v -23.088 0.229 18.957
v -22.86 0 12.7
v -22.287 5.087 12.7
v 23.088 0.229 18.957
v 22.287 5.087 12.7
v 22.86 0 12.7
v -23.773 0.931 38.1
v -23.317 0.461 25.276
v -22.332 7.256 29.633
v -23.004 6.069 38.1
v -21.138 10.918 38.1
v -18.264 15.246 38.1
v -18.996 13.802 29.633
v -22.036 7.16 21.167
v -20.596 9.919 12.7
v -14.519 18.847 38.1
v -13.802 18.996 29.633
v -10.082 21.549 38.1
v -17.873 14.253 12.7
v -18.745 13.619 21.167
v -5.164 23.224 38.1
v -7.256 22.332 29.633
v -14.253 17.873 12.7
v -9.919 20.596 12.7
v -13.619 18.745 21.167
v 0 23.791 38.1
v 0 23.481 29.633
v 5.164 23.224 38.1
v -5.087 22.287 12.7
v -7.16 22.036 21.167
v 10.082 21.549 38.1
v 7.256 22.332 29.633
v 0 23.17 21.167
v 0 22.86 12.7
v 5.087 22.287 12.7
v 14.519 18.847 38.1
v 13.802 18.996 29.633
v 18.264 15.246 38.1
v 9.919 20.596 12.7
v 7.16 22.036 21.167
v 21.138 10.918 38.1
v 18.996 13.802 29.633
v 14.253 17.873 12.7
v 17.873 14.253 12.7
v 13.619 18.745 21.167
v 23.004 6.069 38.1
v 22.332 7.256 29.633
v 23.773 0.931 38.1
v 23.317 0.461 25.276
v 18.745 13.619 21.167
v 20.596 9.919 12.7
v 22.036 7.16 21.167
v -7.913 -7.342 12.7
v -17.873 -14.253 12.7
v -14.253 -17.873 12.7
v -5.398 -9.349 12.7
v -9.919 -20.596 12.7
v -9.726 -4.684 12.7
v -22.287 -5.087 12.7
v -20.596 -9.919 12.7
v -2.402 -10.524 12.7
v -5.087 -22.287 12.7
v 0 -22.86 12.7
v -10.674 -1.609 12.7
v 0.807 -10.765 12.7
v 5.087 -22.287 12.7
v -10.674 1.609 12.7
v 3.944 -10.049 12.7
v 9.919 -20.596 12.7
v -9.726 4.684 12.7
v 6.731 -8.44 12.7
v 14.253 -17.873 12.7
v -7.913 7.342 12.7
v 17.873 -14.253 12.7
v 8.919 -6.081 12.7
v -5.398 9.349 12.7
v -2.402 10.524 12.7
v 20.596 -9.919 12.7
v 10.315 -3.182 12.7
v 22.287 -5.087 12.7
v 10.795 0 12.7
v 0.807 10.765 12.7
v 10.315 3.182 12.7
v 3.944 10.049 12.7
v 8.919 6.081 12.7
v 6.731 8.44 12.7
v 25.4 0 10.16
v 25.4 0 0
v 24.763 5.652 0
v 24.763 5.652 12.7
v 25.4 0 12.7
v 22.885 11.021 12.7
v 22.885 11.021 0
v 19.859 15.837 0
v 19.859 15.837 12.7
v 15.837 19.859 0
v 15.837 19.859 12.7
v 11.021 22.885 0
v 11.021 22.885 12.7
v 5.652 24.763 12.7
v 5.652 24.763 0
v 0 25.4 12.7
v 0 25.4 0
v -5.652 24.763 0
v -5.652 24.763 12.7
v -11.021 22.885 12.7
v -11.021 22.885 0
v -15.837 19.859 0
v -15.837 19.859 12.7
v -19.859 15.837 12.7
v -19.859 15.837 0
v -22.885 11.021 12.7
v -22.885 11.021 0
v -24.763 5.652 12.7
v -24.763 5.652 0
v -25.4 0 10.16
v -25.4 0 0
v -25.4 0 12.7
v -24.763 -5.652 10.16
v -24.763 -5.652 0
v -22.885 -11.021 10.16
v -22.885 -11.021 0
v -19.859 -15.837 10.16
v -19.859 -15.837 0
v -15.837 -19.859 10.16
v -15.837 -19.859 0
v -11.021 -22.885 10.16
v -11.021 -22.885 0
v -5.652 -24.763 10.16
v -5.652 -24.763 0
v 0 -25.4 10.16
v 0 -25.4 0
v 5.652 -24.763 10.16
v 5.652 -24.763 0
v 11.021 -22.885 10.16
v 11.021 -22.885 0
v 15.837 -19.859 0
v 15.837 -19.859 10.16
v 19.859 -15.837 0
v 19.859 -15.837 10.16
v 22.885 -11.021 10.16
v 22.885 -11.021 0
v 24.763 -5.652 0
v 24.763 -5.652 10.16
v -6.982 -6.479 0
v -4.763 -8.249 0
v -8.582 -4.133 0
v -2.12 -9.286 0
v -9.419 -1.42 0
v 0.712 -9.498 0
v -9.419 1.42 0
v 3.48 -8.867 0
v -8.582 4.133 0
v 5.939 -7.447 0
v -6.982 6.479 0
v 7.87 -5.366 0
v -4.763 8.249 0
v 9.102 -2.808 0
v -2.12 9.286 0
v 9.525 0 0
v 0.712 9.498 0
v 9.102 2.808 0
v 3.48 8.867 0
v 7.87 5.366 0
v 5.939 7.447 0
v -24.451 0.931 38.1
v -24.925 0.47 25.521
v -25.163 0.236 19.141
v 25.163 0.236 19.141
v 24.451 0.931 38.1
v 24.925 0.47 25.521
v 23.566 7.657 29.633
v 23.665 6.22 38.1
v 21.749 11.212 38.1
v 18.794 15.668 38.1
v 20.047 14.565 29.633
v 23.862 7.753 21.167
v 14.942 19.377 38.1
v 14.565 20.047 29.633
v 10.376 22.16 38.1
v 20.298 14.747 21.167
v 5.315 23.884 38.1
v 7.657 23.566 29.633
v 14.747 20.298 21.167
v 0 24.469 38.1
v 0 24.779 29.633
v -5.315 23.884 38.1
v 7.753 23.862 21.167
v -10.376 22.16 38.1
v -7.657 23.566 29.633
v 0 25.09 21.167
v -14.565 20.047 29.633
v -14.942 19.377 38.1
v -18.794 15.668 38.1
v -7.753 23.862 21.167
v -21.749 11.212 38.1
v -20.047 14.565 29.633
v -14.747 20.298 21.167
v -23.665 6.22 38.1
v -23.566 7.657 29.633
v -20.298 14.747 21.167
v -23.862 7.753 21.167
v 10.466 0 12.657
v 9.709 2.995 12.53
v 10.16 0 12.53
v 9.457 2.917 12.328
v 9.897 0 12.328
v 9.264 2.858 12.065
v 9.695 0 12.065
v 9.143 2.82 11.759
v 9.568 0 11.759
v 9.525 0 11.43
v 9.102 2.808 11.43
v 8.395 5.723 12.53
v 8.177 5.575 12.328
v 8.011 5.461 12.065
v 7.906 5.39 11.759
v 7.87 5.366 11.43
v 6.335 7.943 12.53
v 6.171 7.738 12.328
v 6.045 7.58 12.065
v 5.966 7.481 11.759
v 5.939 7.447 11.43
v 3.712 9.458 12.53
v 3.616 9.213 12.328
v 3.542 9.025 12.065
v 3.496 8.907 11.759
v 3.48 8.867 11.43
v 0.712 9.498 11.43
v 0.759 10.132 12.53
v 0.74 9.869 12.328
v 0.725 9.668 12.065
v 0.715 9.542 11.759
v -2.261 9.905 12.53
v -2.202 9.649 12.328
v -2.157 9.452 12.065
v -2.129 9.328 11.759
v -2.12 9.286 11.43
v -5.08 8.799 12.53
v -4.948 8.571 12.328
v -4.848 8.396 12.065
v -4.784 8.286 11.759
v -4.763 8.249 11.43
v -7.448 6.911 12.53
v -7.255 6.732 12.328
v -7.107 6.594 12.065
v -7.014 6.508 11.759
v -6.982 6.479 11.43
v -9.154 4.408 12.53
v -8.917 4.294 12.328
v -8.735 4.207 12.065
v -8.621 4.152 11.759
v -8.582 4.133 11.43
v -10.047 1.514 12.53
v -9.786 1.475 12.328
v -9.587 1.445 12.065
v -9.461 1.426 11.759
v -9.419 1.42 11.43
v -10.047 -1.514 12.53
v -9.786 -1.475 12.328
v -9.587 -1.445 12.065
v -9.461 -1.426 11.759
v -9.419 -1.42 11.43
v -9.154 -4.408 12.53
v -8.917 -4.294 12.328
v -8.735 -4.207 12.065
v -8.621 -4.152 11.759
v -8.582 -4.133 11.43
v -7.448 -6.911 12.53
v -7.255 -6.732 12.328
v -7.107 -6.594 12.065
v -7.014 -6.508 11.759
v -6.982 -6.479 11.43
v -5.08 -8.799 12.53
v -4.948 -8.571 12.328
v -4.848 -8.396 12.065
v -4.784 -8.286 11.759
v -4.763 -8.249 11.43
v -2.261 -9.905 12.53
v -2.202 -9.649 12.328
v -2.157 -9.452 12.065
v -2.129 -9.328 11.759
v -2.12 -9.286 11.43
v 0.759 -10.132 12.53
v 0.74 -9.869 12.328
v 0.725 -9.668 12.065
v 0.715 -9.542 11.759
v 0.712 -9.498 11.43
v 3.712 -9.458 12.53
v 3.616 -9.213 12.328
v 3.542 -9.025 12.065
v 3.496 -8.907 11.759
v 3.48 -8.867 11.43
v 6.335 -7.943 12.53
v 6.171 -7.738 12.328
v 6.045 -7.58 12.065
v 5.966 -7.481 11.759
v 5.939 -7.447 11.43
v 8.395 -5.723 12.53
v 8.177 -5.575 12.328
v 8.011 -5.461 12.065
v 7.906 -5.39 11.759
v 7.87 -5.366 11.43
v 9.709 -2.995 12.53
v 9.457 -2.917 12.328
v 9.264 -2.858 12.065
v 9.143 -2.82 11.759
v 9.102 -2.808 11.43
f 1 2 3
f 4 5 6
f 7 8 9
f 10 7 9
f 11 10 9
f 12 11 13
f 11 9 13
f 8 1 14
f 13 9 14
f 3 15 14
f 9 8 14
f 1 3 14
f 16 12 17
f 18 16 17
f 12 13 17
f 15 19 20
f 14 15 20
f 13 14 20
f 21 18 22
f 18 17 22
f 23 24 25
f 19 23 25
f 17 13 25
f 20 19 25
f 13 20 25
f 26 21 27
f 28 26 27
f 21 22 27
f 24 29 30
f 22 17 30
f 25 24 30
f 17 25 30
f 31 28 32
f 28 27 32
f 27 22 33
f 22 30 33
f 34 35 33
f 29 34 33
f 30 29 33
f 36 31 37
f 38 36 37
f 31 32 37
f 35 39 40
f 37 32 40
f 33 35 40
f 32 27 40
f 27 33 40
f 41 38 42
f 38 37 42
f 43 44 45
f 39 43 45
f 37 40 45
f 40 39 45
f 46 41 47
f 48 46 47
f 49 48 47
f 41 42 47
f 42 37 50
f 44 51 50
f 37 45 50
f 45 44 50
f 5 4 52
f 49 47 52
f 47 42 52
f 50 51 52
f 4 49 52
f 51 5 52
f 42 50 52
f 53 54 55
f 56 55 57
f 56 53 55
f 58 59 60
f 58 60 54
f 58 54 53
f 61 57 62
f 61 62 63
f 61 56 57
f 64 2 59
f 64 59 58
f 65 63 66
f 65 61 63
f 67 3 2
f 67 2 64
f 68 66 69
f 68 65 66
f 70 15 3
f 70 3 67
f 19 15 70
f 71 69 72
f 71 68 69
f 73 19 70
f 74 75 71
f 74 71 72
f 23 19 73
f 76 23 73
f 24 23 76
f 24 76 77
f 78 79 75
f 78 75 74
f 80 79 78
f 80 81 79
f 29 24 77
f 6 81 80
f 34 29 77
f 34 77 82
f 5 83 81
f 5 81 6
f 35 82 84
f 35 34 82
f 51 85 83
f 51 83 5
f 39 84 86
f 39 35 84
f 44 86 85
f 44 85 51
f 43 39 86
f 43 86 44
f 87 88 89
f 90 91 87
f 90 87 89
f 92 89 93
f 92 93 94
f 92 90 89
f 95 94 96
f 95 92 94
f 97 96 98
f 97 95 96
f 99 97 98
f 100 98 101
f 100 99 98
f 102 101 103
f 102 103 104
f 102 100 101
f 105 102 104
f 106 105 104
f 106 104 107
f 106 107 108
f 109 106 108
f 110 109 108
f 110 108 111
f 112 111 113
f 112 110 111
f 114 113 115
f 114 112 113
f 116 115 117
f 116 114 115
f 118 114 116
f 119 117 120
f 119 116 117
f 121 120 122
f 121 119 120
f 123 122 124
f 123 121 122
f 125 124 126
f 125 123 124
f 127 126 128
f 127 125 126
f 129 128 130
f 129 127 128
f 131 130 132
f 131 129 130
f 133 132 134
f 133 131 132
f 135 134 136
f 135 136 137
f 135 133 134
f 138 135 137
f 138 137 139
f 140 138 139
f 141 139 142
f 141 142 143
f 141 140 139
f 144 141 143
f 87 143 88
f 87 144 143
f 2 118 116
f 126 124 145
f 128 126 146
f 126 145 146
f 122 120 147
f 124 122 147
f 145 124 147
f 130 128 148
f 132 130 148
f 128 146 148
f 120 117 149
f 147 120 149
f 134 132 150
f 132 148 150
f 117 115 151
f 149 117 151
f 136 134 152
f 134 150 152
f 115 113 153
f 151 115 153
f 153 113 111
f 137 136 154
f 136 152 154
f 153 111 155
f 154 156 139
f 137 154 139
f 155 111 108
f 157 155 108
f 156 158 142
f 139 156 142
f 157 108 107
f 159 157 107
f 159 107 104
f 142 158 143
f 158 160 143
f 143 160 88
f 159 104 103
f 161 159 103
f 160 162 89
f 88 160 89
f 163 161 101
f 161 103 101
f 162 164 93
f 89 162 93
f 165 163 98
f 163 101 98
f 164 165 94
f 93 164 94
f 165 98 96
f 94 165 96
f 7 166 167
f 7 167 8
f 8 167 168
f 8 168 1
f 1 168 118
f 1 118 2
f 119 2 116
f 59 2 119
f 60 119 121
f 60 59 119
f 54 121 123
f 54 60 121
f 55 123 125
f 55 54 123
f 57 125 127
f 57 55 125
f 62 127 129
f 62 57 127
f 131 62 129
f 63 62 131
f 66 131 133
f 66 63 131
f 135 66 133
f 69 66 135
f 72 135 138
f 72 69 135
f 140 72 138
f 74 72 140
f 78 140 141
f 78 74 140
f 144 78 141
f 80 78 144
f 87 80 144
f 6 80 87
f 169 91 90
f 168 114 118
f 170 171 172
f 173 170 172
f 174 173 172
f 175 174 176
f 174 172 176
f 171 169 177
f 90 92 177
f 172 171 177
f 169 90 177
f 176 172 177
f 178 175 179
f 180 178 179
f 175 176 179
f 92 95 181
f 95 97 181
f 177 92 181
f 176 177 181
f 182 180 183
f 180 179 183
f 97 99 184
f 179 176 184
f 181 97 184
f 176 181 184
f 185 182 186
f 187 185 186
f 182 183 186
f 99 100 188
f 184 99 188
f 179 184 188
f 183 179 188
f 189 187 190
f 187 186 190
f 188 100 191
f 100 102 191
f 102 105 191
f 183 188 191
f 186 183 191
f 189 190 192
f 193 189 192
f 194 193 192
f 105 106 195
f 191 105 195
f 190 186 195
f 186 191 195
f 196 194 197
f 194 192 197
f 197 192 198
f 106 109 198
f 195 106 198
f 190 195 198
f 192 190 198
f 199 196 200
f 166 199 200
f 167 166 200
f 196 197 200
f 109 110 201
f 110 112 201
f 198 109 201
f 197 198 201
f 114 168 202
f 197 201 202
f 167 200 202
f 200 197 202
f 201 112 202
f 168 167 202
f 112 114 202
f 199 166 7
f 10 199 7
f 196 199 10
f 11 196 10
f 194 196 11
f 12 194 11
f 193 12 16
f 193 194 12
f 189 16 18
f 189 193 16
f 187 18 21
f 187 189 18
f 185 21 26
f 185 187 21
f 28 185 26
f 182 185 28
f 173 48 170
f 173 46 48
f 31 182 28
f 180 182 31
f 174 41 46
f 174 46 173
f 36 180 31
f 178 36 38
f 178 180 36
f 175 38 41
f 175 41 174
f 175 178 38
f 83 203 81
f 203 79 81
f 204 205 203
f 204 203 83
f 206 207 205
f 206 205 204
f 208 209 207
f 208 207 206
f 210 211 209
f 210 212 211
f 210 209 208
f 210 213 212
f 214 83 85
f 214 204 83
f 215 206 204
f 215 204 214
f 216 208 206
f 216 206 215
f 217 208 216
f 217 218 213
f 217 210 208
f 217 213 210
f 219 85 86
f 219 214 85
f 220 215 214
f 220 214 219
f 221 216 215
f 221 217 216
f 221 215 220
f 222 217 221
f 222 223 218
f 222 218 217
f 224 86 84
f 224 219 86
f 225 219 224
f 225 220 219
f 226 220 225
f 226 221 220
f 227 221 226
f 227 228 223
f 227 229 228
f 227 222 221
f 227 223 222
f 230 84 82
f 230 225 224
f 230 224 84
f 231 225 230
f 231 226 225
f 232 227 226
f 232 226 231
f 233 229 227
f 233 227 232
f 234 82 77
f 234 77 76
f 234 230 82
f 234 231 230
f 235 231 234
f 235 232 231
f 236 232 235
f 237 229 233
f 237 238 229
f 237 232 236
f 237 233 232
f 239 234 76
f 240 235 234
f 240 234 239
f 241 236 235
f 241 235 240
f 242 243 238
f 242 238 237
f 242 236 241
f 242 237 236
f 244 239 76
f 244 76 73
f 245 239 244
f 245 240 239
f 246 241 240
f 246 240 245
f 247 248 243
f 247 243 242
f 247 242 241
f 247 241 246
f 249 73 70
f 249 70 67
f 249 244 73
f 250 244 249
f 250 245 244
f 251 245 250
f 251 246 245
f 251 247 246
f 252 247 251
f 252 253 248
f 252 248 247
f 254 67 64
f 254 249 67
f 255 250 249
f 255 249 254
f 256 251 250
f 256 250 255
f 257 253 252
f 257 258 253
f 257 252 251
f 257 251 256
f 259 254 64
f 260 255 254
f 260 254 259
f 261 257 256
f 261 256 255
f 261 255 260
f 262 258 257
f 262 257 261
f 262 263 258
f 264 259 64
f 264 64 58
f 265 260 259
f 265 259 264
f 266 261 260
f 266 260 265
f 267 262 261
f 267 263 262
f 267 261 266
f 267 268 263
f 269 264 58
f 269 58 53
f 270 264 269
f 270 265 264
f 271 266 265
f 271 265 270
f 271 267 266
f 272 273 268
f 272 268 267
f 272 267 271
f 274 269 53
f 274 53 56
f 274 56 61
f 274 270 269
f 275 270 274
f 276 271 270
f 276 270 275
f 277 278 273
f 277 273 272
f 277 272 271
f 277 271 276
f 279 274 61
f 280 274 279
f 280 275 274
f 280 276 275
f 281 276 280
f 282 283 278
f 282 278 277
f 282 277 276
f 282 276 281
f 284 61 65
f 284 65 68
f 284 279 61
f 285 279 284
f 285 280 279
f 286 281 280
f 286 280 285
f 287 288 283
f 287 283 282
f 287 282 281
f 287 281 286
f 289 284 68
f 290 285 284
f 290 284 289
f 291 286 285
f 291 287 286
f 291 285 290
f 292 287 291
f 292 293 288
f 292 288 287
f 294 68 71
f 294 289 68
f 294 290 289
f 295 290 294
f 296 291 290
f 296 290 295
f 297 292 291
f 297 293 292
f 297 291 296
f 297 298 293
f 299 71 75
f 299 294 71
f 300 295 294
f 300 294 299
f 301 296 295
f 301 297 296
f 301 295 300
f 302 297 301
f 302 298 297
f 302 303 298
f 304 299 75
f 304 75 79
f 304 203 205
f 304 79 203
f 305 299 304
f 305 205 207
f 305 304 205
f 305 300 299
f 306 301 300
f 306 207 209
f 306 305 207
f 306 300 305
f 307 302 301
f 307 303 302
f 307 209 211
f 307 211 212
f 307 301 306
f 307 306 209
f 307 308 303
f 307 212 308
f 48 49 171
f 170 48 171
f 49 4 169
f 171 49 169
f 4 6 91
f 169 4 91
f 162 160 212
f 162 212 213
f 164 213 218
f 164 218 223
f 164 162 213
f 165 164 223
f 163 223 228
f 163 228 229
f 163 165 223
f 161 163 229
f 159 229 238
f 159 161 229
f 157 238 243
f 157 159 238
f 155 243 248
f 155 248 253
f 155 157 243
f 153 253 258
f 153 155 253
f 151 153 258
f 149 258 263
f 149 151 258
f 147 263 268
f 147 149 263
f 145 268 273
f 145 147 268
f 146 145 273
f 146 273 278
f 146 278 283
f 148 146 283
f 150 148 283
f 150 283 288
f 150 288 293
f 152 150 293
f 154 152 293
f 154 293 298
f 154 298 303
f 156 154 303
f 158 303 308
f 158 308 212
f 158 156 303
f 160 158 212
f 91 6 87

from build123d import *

# Parameters (mm, degrees)
SKETCH1_R                     = 25.4
SKETCH1_R_2                   = 9.525
BOSS_EXTRUDE1_DEPTH           = 12.7
CHAMFER1_SIZE                 = 2.54
FILLET1_R                     = 1.27
EXTRUDE_THIN2_DEPTH           = 25.4
EXTRUDE_THIN2_DRAFT           = 2.1
EXTRUDE_THIN2_OTHER_WAY_DEPTH = 2.54


with BuildPart() as part:
    # Sketch1 → Boss-Extrude1 (new body)
    with BuildSketch(Plane.XY):
        Circle(SKETCH1_R)
        Circle(SKETCH1_R_2, mode=Mode.SUBTRACT)
    extrude(amount=BOSS_EXTRUDE1_DEPTH)

    # Chamfer1
    chamfer1_edges = [part.edges().sort_by_distance(p)[0] for p in [
        (-25.4, 0, 12.7),
    ]]
    chamfer(chamfer1_edges, length=CHAMFER1_SIZE)

    # Fillet1
    fillet1_edges = [part.edges().sort_by_distance(p)[0] for p in [
        (-9.525, 0, 12.7),
    ]]
    fillet(fillet1_edges, radius=FILLET1_R)


with BuildPart() as extrude_thin2_tool:
    # Sketch2 → Extrude-Thin2 (with draft: the straight prism first)
    with BuildSketch(Plane.XY.offset(12.7)):
        with BuildLine():
            Line((22.86, 0), (25.4, 0))
            ThreePointArc((25.4, 0), (0, 25.4), (-25.4, 0))
            Line((-25.4, 0), (-22.86, 0))
            ThreePointArc((-22.86, 0), (0, 22.86), (22.86, 0))
        make_face()
    extrude(amount=EXTRUDE_THIN2_DEPTH)
    # Extrude-Thin2: the draft: its side faces are tilted about the plane it starts from
    extrude_thin2_sides = [extrude_thin2_tool.faces().sort_by_distance(p)[0] for p in [
        (24.13, 0, 25.4),
        (0, 25.4, 25.4),
        (-24.13, 0, 25.4),
        (0, 22.86, 25.4),
    ]]
    draft(extrude_thin2_sides, Plane.XY.offset(12.7), EXTRUDE_THIN2_DRAFT)


with BuildPart() as part_1:
    add(part.part)

    # Extrude-Thin2: add extrude_thin2_tool
    add(extrude_thin2_tool.part)

    # Sketch2 → Extrude-Thin2 other way (add)
    with BuildSketch(Plane.XY.offset(12.7)):
        with BuildLine():
            Line((22.86, 0), (25.4, 0))
            ThreePointArc((25.4, 0), (0, 25.4), (-25.4, 0))
            Line((-25.4, 0), (-22.86, 0))
            ThreePointArc((-22.86, 0), (0, 22.86), (22.86, 0))
        make_face()
    extrude(amount=-EXTRUDE_THIN2_OTHER_WAY_DEPTH)


solid = part_1.part
